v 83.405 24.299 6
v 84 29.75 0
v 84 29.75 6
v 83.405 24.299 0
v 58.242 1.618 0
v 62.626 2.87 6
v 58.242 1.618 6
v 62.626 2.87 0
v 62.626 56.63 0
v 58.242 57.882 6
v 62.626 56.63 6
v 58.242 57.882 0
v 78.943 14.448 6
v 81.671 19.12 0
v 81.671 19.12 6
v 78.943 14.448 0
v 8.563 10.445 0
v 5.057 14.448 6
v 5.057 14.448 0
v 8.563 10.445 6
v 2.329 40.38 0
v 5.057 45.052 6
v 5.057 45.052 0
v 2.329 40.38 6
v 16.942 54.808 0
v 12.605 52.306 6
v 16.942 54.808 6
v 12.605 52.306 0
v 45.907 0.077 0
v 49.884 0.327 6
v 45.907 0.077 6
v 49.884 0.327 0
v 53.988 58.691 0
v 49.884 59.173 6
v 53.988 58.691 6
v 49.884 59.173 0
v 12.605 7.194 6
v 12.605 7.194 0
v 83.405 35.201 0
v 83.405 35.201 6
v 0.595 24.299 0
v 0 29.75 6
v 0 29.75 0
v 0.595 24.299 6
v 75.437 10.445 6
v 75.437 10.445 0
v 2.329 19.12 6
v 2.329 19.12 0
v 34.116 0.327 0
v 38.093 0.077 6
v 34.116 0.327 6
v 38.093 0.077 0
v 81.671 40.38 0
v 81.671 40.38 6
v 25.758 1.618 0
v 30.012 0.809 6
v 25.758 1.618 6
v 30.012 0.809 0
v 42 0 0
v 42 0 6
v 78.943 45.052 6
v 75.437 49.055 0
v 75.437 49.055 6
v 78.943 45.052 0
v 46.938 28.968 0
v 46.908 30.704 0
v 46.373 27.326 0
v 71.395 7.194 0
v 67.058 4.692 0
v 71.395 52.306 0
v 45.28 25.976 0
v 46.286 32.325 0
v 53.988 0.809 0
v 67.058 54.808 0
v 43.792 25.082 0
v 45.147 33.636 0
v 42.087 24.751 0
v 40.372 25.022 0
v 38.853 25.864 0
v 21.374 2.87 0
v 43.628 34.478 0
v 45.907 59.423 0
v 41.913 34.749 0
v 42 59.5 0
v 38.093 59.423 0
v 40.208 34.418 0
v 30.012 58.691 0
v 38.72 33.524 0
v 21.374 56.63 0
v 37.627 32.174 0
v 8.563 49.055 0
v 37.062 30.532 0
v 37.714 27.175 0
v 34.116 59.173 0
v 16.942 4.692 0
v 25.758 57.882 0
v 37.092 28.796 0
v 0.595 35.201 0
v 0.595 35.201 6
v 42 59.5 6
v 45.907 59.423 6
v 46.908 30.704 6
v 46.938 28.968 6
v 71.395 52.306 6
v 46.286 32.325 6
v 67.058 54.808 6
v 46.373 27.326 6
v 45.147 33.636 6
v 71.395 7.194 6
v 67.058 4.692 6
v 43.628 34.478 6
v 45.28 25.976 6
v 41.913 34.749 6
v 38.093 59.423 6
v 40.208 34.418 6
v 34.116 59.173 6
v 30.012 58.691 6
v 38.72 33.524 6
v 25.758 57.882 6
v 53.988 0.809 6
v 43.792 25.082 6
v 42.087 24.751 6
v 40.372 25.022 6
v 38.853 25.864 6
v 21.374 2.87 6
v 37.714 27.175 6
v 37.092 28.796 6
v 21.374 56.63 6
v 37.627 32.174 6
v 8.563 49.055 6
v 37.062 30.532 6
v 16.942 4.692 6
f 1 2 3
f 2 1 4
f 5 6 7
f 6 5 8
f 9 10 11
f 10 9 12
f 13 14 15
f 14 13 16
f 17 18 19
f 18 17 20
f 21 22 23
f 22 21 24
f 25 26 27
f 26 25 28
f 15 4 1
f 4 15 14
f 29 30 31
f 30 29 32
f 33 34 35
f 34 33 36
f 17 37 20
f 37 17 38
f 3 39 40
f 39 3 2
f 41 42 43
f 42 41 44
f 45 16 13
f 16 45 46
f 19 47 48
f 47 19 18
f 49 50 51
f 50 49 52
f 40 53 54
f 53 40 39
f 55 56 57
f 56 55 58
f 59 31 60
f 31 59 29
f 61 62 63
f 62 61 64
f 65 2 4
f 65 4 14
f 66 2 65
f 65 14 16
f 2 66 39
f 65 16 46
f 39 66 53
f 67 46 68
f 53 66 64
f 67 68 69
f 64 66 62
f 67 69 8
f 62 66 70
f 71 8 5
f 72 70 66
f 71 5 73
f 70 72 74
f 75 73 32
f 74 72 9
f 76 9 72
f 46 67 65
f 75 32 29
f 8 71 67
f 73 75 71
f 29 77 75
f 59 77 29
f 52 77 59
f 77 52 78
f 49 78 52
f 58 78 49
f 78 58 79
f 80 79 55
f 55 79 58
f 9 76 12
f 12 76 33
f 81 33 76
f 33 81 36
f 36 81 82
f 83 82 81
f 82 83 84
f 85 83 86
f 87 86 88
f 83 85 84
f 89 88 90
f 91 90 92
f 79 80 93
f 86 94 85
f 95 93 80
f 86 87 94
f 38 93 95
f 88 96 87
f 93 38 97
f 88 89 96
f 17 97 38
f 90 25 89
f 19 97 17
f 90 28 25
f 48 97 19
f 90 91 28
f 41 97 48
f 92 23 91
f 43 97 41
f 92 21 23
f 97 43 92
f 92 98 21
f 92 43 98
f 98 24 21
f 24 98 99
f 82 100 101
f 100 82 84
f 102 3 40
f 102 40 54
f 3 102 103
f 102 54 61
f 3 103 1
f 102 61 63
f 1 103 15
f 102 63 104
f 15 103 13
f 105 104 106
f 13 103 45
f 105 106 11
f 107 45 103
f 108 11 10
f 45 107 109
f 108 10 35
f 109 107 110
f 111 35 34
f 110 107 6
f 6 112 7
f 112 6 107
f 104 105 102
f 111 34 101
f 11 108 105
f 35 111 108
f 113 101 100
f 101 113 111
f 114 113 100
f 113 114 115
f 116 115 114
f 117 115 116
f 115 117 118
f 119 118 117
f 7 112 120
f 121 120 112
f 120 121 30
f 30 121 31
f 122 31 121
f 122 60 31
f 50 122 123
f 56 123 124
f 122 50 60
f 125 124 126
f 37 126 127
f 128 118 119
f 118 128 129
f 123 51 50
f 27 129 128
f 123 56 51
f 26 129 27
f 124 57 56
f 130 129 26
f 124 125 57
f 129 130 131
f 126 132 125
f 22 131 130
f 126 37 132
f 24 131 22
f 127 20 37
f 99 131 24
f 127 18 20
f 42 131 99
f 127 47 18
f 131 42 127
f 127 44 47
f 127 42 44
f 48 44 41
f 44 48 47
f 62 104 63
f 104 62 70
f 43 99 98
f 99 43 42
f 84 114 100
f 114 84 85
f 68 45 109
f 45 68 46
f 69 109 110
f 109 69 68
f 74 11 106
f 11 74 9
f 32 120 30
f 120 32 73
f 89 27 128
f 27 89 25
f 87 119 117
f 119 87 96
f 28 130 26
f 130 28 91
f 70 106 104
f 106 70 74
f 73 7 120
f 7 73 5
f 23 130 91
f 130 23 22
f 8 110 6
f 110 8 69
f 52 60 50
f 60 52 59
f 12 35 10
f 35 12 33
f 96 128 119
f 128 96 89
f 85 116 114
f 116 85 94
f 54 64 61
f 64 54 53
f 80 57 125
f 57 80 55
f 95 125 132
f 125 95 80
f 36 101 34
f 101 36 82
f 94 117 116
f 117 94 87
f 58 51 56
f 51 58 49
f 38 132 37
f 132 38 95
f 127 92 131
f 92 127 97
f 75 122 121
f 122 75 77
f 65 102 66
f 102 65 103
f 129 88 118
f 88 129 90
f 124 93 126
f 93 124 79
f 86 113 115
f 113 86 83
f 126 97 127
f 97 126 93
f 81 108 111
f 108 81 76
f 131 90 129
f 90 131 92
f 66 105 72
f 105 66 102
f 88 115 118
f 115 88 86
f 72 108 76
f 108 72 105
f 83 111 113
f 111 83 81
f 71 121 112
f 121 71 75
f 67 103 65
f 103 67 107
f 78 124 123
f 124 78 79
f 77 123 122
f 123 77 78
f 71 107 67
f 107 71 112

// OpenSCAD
$fn = 32;

// ----------------------------------------------------------------------
// Cam plate: double_lobe cam, base R28
// ----------------------------------------------------------------------

// --- parameters (mm) ---
base_r = 28;              // base circle radius
lobe_h = 14;              // cam lobe rise
bore_r = 5;               // shaft bore radius
plate_t = 6;              // plate thickness, Z (extrusion height)

profile = [[84, 29.75], [83.405, 35.201], [81.671, 40.38], [78.943, 45.052], [75.437, 49.055], [71.395, 52.306], [67.058, 54.808], [62.626, 56.63], [58.242, 57.882], [53.988, 58.691], [49.884, 59.173], [45.907, 59.423], [42, 59.5], [38.093, 59.423], [34.116, 59.173], [30.012, 58.691], [25.758, 57.882], [21.374, 56.63], [16.942, 54.808], [12.605, 52.306], [8.563, 49.055], [5.057, 45.052], [2.329, 40.38], [0.595, 35.201], [0, 29.75], [0.595, 24.299], [2.329, 19.12], [5.057, 14.448], [8.563, 10.445], [12.605, 7.194], [16.942, 4.692], [21.374, 2.87], [25.758, 1.618], [30.012, 0.809], [34.116, 0.327], [38.093, 0.077], [42, 0], [45.907, 0.077], [49.884, 0.327], [53.988, 0.809], [58.242, 1.618], [62.626, 2.87], [67.058, 4.692], [71.395, 7.194], [75.437, 10.445], [78.943, 14.448], [81.671, 19.12], [83.405, 24.299]];  // primary outline, 48 points, counter clockwise
void_1 = [[46.908, 30.704], [46.286, 32.325], [45.147, 33.636], [43.628, 34.478], [41.913, 34.749], [40.208, 34.418], [38.72, 33.524], [37.627, 32.174], [37.062, 30.532], [37.092, 28.796], [37.714, 27.175], [38.853, 25.864], [40.372, 25.022], [42.087, 24.751], [43.792, 25.082], [45.28, 25.976], [46.373, 27.326], [46.938, 28.968]];  // shaft bore, 18 points

// --- the one profile operation ---
difference() {
  linear_extrude(height = plate_t) polygon(points = profile);
  translate([0, 0, -1])
    linear_extrude(height = plate_t + 2) polygon(points = void_1);
}
